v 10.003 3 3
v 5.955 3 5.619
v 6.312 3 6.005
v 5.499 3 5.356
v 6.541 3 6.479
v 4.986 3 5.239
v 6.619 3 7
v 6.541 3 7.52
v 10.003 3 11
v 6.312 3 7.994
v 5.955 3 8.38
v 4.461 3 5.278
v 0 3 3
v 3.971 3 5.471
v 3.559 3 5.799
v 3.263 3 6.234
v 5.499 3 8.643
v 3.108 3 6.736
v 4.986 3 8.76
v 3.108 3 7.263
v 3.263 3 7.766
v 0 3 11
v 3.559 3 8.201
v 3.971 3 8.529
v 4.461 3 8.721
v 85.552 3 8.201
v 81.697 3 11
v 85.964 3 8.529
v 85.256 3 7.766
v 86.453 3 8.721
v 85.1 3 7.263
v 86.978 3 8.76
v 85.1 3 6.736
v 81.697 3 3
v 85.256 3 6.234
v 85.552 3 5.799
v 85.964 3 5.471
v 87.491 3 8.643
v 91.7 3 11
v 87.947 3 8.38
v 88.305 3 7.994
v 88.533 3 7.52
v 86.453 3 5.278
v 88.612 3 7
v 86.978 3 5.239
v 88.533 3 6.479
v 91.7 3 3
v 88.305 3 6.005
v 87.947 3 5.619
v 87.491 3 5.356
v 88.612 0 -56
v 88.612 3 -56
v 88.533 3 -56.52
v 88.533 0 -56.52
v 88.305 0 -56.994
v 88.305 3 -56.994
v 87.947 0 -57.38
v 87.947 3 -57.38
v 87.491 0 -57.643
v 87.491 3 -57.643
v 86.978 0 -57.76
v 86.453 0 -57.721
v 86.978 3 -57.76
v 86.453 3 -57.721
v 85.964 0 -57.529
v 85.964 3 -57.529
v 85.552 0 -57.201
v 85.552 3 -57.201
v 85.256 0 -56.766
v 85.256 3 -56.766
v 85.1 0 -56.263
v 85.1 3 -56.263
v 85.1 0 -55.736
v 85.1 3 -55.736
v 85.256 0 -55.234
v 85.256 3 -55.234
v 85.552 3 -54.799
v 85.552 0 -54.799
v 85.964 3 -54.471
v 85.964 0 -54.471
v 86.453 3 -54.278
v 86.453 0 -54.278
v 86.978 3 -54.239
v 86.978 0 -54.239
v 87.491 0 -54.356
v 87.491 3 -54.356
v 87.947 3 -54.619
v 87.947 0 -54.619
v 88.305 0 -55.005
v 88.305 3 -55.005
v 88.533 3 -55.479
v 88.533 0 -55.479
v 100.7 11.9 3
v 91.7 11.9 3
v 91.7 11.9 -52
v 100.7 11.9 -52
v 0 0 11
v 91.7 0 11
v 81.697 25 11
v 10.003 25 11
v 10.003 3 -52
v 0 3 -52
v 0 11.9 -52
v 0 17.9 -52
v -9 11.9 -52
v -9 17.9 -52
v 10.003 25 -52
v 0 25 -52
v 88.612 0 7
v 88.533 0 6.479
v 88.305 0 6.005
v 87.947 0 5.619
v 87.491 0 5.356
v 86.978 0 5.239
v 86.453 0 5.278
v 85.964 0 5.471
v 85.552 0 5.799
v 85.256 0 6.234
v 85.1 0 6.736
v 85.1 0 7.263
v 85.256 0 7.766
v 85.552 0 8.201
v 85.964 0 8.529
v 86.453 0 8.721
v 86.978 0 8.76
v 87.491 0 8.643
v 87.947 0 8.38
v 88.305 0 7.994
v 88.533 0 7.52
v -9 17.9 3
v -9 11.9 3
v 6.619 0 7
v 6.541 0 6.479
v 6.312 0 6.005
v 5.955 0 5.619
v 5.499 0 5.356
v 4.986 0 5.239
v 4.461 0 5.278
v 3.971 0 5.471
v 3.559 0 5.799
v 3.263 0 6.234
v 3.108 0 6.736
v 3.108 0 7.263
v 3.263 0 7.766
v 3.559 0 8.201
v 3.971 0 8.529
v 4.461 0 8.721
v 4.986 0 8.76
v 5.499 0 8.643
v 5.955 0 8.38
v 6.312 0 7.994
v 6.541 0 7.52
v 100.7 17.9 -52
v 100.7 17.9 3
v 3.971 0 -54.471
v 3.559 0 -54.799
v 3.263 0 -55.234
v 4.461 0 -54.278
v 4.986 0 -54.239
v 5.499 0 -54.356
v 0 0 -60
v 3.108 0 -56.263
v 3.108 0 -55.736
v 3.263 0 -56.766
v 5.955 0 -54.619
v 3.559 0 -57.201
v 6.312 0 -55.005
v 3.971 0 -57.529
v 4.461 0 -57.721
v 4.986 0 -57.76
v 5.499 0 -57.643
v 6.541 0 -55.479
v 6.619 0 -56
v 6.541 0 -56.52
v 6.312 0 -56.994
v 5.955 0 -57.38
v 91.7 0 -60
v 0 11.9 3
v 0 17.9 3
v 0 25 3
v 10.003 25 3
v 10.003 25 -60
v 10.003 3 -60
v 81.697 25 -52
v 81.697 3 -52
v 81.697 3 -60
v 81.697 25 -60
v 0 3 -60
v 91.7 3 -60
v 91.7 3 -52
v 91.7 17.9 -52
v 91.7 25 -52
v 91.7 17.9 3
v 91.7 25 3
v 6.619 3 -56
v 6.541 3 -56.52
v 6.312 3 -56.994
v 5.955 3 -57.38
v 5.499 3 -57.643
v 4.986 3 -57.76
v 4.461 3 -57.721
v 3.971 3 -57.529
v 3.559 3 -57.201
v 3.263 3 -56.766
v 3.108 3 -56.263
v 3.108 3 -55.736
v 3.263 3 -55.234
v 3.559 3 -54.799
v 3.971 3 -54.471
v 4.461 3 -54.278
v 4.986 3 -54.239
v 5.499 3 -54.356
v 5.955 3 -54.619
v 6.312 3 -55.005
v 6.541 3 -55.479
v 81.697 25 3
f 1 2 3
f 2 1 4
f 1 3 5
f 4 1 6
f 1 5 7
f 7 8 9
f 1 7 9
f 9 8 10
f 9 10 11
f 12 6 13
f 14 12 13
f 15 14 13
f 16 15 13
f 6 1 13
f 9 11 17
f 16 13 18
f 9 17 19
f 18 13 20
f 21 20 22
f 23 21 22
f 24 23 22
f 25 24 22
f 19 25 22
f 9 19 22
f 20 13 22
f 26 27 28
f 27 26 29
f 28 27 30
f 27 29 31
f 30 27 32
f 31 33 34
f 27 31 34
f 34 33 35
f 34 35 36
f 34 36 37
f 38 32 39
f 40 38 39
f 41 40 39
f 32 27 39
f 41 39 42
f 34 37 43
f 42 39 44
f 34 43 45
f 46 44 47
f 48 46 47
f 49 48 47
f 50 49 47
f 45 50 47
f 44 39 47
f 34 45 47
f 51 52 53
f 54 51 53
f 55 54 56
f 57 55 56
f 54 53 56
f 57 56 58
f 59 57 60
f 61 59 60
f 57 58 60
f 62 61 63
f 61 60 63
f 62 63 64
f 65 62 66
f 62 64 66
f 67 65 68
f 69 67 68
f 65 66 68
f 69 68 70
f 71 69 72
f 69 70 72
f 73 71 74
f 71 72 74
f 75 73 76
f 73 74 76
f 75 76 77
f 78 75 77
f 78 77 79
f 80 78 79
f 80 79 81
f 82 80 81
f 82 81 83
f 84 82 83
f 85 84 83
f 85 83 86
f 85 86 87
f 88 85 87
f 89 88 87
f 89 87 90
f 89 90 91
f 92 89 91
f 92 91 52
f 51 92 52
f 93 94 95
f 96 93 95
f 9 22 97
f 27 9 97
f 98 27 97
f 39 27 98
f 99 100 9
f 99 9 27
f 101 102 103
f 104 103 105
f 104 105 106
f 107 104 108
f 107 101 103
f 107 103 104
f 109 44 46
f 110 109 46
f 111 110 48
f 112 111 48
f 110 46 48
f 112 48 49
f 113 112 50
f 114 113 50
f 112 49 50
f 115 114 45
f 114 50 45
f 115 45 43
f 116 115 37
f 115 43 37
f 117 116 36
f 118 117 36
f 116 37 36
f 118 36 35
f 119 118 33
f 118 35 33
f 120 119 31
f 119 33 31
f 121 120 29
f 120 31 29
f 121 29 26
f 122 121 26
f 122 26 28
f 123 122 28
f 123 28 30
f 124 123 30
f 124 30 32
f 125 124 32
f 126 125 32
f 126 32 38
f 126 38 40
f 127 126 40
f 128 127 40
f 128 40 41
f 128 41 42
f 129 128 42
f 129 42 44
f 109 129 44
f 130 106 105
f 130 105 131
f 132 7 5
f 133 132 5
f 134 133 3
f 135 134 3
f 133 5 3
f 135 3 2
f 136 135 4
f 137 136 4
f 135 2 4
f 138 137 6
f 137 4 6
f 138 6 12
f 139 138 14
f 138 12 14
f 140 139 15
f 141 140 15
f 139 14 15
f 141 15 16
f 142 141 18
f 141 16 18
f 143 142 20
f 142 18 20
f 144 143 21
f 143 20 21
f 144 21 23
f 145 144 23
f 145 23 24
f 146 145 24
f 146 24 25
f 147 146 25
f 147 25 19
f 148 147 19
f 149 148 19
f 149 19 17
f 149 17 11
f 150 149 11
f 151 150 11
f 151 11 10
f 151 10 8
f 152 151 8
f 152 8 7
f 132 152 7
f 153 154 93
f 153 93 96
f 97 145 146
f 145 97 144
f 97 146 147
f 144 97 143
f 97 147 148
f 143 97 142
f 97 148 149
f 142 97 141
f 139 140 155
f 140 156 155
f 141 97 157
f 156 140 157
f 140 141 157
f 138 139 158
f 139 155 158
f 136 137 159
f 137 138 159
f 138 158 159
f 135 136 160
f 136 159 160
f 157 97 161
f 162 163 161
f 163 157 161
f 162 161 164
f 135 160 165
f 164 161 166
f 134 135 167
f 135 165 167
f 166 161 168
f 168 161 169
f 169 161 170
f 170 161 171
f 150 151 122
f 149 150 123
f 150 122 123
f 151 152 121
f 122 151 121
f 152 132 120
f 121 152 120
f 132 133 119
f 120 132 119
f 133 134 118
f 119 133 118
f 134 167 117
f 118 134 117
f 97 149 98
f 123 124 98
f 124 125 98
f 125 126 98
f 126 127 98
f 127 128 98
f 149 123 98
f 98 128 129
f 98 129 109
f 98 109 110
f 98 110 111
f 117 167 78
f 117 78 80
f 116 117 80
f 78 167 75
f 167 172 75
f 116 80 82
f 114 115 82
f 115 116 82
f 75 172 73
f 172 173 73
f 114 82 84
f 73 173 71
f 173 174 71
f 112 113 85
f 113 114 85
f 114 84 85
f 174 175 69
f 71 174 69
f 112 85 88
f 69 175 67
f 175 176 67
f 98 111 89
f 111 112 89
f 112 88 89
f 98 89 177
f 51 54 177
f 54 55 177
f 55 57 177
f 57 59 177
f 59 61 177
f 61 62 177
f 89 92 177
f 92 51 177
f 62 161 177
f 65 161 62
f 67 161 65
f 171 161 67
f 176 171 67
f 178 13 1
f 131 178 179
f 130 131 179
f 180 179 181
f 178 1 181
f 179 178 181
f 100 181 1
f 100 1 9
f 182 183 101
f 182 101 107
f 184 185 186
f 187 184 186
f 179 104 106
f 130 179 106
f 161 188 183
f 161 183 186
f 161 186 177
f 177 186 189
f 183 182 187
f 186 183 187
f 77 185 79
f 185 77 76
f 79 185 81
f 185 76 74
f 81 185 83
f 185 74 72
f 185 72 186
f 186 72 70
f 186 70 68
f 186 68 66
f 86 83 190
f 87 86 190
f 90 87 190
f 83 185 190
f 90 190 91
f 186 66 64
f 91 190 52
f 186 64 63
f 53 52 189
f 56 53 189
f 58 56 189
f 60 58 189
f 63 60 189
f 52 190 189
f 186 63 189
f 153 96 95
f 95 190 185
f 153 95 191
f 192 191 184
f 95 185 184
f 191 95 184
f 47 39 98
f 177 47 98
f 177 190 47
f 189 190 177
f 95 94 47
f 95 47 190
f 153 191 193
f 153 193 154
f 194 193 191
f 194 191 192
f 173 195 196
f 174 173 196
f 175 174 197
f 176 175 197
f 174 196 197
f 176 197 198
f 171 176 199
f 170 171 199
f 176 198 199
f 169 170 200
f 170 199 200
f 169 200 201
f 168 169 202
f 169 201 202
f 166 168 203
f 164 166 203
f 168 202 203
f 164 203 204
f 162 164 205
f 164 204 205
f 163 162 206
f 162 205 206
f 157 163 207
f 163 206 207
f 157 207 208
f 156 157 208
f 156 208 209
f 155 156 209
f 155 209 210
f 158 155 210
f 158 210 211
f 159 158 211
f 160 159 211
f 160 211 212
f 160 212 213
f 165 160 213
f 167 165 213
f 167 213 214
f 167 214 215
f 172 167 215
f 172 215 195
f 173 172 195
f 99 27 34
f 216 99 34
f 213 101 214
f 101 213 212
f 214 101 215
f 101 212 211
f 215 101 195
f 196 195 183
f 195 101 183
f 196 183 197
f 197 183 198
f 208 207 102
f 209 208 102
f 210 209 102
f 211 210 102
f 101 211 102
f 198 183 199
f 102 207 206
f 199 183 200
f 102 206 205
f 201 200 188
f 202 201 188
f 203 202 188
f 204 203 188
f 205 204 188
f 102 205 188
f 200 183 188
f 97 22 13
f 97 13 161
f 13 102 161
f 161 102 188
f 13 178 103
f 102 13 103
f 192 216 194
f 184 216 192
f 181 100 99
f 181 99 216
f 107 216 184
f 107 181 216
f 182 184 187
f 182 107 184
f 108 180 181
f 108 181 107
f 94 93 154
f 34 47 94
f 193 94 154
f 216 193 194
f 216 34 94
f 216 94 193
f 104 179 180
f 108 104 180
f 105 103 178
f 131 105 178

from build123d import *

# Parameters (mm, degrees)
SKETCH_1_W             = 91.7
SKETCH_1_H             = 71
EXTRUDE_1_DEPTH        = 25
SKETCH_2_W             = 10.00292335
SKETCH_2_H             = 22
CUT_EXTRUDE_1_DEPTH    = 8.000270383
SKETCH_3_W             = 54.999459234
SKETCH_3_H             = 13.1
EXTRUDE_2_DEPTH        = 9
SKETCH_4_W             = 8.000270383
SKETCH_4_H             = 22
CUT_EXTRUDE_2_DEPTH    = 10.00292335
SKETCH_5_W             = 8.000270383
SKETCH_5_H             = 22
CUT_EXTRUDE_3_DEPTH    = 10.00292335
SKETCH_6_W             = 54.999459234
SKETCH_6_H             = 13.1
EXTRUDE_3_DEPTH        = 9
SKETCH_7_W             = 8.000270383
SKETCH_7_H             = 22
CUT_EXTRUDE_4_DEPTH    = 10.00292335
SKETCH_8_W             = 9
SKETCH_8_H             = 7.1
CUT_EXTRUDE_5_DEPTH    = 122.38556723
SKETCH_9_W             = 9
SKETCH_9_H             = 7.1
CUT_EXTRUDE_6_DEPTH    = 122.38556723
HOLE_WIZARD_M3_1_D     = 3.531196766
HOLE_WIZARD_M3_1_DEPTH = 25


with BuildPart() as part:
    # 草图1 → 凸台-拉伸1 (new body)
    with BuildSketch(Plane(origin=(0, 25, 0), x_dir=(1, 0, 0), z_dir=(0, 1, 0))):
        with Locations((45.85, 24.5)):
            Rectangle(SKETCH_1_W, SKETCH_1_H)
    extrude(amount=-EXTRUDE_1_DEPTH)

    # 草图2 → 切除-拉伸1 (cut)
    with BuildSketch(Plane(origin=(0, 0, -60), x_dir=(-1, 0, 0), z_dir=(0, 0, -1))):
        with Locations((-5.001461675, 14)):
            Rectangle(SKETCH_2_W, SKETCH_2_H)
    extrude(amount=-CUT_EXTRUDE_1_DEPTH, mode=Mode.SUBTRACT)

    # 草图3 → 凸台-拉伸2 (add)
    with BuildSketch(Plane.ZY):
        with Locations((-24.5, 18.45)):
            Rectangle(SKETCH_3_W, SKETCH_3_H)
    extrude(amount=EXTRUDE_2_DEPTH)

    # 草图4 → 切除-拉伸2 (cut)
    with BuildSketch(Plane.ZY):
        with Locations((6.999864808, 14)):
            Rectangle(SKETCH_4_W, SKETCH_4_H)
    extrude(amount=-CUT_EXTRUDE_2_DEPTH, mode=Mode.SUBTRACT)

    # 草图5 → 切除-拉伸3 (cut)
    with BuildSketch(Plane(origin=(91.7, 0, 0), x_dir=(0, 0, -1), z_dir=(1, 0, 0))):
        with Locations((55.999864809, 14)):
            Rectangle(SKETCH_5_W, SKETCH_5_H)
    extrude(amount=-CUT_EXTRUDE_3_DEPTH, mode=Mode.SUBTRACT)

    # 草图6 → 凸台-拉伸3 (add)
    with BuildSketch(Plane(origin=(91.7, 0, 0), x_dir=(0, 0, -1), z_dir=(1, 0, 0))):
        with Locations((24.5, 18.45)):
            Rectangle(SKETCH_6_W, SKETCH_6_H)
    extrude(amount=EXTRUDE_3_DEPTH)

    # 草图7 → 切除-拉伸4 (cut)
    with BuildSketch(Plane(origin=(91.7, 0, 0), x_dir=(0, 0, -1), z_dir=(1, 0, 0))):
        with Locations((-6.999864808, 14)):
            Rectangle(SKETCH_7_W, SKETCH_7_H)
    extrude(amount=-CUT_EXTRUDE_4_DEPTH, mode=Mode.SUBTRACT)

    # 草图8 → 切除-拉伸5 (cut, through all)
    with BuildSketch(Plane(origin=(0, 0, -51.999729617), x_dir=(-1, 0, 0), z_dir=(0, 0, -1))):
        with Locations((4.5, 21.45)):
            Rectangle(SKETCH_8_W, SKETCH_8_H)
    extrude(amount=-CUT_EXTRUDE_5_DEPTH, mode=Mode.SUBTRACT)

    # 草图9 → 切除-拉伸6 (cut, through all)
    with BuildSketch(Plane.XY.offset(2.999729617)):
        with Locations((96.2, 21.45)):
            Rectangle(SKETCH_9_W, SKETCH_9_H)
    extrude(amount=-CUT_EXTRUDE_6_DEPTH, mode=Mode.SUBTRACT)

    # M3 间隙孔1
    with Locations(Plane(origin=(0, 0, 0), x_dir=(-1, 0, 0), z_dir=(0, -1, 0))):
        with Locations((-86.846324066, 55.999601401), (-86.846324066, -6.999601401), (-4.853675934, -6.999601401), (-4.853675934, 55.999601401)):
            Hole(HOLE_WIZARD_M3_1_D / 2, depth=HOLE_WIZARD_M3_1_DEPTH)


solid = part.part
